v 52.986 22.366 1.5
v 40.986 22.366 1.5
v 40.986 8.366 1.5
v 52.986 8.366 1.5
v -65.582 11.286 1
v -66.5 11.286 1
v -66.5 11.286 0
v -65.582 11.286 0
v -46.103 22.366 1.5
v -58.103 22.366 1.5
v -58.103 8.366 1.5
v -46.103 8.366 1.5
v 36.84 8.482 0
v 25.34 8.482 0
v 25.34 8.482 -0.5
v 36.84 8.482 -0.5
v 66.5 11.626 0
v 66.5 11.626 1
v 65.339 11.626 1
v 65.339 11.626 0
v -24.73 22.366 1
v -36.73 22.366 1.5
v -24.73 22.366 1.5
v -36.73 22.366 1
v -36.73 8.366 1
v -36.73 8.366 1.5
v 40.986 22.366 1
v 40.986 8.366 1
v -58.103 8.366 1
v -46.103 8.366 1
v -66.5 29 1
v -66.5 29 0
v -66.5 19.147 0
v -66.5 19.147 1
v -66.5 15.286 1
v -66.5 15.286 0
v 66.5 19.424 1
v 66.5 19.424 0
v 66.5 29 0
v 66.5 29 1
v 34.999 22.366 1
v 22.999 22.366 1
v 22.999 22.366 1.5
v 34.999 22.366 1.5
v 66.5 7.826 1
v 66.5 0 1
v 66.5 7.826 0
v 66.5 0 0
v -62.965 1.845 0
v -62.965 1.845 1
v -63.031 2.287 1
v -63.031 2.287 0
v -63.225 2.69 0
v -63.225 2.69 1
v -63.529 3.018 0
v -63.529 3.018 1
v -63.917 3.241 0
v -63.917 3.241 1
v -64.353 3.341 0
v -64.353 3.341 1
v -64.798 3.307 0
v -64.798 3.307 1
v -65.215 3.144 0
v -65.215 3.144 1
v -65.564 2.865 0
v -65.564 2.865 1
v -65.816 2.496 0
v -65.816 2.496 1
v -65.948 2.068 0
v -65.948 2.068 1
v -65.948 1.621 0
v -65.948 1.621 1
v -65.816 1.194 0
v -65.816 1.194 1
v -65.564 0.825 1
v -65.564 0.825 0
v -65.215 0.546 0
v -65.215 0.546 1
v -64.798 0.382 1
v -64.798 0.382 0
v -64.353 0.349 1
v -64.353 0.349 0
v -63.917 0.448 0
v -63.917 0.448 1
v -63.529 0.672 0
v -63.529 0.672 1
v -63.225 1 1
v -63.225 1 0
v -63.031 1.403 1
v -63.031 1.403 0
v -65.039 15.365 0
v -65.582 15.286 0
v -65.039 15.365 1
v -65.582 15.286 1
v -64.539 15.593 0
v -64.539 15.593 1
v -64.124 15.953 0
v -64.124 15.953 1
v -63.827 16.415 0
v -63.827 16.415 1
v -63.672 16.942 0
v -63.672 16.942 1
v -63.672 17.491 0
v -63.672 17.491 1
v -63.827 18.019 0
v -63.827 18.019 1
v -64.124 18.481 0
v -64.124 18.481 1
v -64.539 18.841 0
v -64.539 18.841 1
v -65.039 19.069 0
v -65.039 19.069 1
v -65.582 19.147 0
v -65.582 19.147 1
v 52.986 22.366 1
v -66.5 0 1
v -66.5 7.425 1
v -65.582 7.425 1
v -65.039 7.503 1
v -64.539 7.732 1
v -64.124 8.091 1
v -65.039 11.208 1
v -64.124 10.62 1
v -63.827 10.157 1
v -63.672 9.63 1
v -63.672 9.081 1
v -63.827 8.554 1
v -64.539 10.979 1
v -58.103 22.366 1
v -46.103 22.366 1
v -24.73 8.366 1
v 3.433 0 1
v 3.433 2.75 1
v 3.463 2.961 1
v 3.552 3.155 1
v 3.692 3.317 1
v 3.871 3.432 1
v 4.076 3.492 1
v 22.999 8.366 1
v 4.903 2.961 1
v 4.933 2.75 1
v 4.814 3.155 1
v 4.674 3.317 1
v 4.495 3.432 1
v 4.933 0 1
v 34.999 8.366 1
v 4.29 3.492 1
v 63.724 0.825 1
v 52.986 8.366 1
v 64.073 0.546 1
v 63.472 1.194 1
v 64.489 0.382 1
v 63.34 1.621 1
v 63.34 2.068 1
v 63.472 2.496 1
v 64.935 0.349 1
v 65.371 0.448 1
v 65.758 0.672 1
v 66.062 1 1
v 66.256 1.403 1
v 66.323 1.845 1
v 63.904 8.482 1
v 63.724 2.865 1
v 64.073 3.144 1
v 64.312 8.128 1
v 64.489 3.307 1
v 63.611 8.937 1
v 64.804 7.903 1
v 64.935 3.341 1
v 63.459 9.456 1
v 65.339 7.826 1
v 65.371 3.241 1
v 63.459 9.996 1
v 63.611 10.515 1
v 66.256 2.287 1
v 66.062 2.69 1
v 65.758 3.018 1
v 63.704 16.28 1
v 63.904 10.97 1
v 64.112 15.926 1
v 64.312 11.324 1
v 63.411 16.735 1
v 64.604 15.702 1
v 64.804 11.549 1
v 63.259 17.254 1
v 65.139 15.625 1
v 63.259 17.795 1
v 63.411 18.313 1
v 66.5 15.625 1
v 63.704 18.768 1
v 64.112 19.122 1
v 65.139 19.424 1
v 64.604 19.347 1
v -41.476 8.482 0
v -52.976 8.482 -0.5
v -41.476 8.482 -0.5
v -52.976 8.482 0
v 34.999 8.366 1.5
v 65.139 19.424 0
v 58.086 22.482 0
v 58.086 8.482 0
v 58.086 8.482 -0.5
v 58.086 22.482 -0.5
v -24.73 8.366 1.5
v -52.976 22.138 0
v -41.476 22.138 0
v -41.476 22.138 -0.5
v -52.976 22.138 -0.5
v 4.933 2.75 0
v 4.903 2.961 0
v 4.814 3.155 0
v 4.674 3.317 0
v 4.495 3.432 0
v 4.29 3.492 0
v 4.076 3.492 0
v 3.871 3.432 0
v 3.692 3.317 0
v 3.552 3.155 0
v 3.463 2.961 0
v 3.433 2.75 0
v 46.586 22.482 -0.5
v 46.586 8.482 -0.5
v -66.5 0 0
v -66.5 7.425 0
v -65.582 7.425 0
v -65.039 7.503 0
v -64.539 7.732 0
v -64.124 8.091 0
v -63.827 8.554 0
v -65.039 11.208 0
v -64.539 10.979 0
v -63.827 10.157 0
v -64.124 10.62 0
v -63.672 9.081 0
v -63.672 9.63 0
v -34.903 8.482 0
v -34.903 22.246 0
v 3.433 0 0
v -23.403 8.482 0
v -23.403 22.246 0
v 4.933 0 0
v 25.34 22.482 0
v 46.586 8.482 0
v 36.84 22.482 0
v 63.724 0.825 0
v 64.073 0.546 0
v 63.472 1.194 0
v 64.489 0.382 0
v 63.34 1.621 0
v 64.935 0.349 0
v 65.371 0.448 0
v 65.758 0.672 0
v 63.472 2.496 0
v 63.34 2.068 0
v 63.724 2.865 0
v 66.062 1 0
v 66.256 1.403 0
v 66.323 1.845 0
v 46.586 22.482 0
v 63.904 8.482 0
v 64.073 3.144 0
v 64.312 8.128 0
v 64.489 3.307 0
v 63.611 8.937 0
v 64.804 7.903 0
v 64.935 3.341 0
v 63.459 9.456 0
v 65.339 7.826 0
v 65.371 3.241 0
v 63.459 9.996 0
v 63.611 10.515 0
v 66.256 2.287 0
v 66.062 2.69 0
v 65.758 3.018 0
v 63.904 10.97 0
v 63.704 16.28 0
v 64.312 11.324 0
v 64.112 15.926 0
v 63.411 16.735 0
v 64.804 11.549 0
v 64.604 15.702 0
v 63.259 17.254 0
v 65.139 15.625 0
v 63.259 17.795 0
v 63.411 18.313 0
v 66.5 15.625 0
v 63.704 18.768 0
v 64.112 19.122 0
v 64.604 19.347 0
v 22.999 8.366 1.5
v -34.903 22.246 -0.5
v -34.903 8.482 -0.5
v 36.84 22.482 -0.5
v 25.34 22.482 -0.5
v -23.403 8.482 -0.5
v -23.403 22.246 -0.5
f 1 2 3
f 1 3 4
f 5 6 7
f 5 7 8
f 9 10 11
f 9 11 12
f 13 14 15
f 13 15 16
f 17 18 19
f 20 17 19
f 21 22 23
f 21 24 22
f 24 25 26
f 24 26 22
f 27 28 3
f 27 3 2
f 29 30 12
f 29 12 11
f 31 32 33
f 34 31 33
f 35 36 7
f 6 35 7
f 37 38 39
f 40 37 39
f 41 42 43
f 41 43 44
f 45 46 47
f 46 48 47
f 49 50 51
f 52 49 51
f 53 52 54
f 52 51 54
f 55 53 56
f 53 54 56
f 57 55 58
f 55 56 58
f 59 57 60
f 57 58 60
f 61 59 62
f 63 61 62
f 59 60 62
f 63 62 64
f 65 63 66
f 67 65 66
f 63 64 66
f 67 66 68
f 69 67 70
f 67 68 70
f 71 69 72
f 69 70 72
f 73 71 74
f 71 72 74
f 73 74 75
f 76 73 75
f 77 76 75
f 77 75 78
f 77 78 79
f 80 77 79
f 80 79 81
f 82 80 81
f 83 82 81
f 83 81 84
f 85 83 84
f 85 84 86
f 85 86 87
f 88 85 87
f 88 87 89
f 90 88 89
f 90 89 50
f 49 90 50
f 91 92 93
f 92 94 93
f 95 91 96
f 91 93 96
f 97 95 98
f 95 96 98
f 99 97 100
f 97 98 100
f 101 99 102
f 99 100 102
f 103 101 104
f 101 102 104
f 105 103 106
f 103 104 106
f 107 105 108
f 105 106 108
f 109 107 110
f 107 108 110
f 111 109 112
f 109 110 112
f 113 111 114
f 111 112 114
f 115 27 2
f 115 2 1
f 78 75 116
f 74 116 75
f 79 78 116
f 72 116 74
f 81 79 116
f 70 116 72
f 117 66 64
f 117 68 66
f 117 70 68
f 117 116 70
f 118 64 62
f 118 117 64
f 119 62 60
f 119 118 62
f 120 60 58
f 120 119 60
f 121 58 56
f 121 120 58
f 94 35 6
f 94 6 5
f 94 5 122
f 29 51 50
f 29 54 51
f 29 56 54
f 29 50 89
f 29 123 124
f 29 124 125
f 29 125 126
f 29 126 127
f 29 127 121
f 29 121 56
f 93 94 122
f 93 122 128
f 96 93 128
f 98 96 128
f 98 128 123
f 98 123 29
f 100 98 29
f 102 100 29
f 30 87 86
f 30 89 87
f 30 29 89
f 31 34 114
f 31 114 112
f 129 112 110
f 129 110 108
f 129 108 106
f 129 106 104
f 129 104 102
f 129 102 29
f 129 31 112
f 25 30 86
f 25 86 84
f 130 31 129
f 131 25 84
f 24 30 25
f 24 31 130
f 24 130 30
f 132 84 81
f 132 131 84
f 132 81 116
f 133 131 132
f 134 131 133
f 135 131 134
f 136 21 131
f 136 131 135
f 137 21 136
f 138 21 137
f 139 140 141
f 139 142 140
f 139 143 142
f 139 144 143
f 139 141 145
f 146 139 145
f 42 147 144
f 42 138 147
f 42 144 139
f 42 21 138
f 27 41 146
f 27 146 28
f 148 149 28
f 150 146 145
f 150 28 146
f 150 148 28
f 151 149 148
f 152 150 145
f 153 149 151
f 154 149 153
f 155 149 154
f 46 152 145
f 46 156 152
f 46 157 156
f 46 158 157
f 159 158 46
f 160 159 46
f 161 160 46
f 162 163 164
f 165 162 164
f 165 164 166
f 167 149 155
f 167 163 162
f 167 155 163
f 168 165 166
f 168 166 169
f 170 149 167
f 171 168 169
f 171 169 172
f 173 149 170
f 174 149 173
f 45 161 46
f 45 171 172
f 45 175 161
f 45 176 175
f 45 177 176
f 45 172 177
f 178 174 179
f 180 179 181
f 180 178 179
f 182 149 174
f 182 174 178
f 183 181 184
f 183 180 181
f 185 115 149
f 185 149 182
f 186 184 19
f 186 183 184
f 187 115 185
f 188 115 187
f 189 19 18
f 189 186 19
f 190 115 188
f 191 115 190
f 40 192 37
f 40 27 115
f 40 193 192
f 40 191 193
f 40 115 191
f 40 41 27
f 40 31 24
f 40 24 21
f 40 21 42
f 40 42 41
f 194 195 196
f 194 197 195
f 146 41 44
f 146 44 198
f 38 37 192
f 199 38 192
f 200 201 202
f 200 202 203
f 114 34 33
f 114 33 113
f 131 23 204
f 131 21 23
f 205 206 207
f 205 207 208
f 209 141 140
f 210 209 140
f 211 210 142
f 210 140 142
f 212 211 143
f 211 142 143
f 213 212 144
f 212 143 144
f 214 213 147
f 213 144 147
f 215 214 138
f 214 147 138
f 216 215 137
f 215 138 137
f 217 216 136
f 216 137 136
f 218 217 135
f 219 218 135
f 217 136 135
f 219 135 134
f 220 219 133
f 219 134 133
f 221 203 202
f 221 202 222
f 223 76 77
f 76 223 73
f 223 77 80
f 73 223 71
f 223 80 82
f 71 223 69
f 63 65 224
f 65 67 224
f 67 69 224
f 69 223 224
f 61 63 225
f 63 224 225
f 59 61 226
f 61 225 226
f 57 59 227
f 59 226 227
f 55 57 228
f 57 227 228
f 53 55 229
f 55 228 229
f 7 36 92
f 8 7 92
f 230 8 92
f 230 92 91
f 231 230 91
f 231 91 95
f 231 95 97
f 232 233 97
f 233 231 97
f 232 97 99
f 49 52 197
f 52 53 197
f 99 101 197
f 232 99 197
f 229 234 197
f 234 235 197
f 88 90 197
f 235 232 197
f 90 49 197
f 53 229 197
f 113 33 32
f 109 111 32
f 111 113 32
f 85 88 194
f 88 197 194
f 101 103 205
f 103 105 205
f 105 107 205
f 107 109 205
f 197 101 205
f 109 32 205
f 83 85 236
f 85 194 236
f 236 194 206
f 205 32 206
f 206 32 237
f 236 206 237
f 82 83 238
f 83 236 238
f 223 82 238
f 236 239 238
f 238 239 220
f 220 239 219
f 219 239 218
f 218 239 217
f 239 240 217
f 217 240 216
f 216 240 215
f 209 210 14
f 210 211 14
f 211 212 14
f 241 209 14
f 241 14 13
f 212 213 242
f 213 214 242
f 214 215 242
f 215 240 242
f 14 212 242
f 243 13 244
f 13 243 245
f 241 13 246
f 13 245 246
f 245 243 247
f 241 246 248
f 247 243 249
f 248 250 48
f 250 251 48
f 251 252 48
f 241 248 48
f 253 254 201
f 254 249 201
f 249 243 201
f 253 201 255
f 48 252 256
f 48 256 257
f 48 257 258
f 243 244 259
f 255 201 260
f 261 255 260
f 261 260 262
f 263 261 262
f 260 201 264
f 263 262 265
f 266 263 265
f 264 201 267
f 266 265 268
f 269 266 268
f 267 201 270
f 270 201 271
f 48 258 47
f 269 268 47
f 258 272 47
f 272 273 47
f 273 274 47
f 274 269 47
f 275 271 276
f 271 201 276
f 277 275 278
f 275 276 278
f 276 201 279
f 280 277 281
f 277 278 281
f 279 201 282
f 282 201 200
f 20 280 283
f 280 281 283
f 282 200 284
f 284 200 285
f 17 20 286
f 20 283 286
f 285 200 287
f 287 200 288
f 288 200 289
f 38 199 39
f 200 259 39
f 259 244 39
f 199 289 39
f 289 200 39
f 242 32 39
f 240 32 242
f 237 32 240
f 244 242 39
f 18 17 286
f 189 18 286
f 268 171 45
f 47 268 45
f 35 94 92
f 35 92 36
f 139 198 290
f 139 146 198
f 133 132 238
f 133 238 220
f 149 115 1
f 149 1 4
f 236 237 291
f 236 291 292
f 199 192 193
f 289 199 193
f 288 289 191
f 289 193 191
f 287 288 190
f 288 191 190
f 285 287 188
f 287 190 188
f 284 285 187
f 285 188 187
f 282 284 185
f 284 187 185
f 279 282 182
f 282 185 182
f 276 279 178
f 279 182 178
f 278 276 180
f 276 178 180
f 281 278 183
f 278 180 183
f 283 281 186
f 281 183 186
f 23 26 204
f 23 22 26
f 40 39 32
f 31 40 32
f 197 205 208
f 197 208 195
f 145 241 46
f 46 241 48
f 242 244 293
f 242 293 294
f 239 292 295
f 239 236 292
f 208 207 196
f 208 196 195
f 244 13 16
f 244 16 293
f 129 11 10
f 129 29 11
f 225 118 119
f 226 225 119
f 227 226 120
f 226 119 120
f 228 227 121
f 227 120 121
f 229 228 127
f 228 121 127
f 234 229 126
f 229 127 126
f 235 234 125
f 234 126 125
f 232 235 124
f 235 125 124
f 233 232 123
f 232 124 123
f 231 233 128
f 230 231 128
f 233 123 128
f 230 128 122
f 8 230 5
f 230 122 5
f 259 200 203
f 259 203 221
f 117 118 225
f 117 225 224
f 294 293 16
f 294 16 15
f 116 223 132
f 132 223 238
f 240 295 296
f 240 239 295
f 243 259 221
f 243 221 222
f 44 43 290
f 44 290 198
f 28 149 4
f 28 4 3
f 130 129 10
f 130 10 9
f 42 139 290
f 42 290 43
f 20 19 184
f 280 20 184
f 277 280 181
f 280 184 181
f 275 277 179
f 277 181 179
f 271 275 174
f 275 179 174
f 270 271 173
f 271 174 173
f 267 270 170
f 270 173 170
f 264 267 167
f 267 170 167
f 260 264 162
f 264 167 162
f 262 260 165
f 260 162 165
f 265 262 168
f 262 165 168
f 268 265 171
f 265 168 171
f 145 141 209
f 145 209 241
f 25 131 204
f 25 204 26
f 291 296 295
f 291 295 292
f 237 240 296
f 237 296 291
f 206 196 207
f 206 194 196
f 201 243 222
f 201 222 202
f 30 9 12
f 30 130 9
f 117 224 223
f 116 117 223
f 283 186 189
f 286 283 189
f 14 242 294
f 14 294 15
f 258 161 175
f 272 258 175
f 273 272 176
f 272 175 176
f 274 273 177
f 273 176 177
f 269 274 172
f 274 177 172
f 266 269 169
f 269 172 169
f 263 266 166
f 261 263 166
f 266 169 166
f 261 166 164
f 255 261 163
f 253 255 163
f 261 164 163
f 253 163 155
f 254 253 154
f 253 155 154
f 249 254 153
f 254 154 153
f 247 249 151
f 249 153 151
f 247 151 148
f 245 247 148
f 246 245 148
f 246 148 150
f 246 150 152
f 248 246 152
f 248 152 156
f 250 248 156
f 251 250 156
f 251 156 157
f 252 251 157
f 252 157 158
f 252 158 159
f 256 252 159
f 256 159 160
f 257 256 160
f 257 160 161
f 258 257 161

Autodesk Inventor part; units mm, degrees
ref_plane "YZ Plane" through (0, 0, 0) normal (1, 0, 0) x (0, 1, 0)
ref_plane "XZ Plane" through (0, 0, 0) normal (0, 1, 0) x (-1, 0, 0)
ref_plane "XY Plane" through (0, 0, 0) normal (0, 0, 1) x (1, 0, 0)
sketch "Sketch1" plane through (0, 0, 0) normal (0, 0, 1) x (1, 0, 0)
  line L0 (0, 37.7) -> (0, -2.9) projected
  line L1 (-79.8, 0) -> (106.4, 0) projected
  line L2 (-66.5, 0) -> (66.5, 0)
  line L3 (66.5, 0) -> (66.5, 29)
  line L4 (66.5, 29) -> (-66.5, 29)
  line L5 (-66.5, 29) -> (-66.5, 0)
  dimension "d0" = 133
  dimension "d1" = 29
extrude "Extrusion1" add sketch "Sketch1" along normal blind 1
decal "Decal1"
decal "Decal2"
sketch "Sketch5" plane through (0, 0, 1) normal (0, 0, 1) x (1, 0, 0)
  line L0 (-66.5, 0) -> (-66.5, 29) projected
  line L1 (66.5, 29) -> (66.5, 0) projected
  line L2 (-66.5, 19.147) -> (-65.5825, 19.147)
  line L3 (-65.5825, 19.147) -> (-65.5825, 15.2864)
  line L4 (-65.5825, 15.2864) -> (-66.5, 15.2864)
  line L5 (-66.5, 15.2864) -> (-66.5, 19.147)
  line L6 (-66.5, 11.2859) -> (-65.5825, 11.2859)
  line L7 (-65.5825, 11.2859) -> (-65.5825, 7.4252)
  line L8 (-65.5825, 7.4252) -> (-66.5, 7.4252)
  line L9 (-66.5, 7.4252) -> (-66.5, 11.2859)
  circle A0 centre (-65.5825, 17.2167) radius 1.9303
  circle A1 centre (-65.5825, 9.3555) radius 1.9303
  line L10 (66.5, 19.4238) -> (65.1393, 19.4238)
  line L11 (65.1393, 19.4238) -> (65.1393, 15.6247)
  line L12 (65.1393, 15.6247) -> (66.5, 15.6247)
  line L13 (66.5, 15.6247) -> (66.5, 19.4238)
  line L14 (66.5, 11.6256) -> (65.3393, 11.6256)
  line L15 (65.3393, 11.6256) -> (65.3393, 7.8264)
  line L16 (65.3393, 7.8264) -> (66.5, 7.8264)
  line L17 (66.5, 7.8264) -> (66.5, 11.6256)
  circle A2 centre (65.1393, 17.5243) radius 1.8996
  circle A3 centre (65.3393, 9.726) radius 1.8996
  circle A4 centre (-64.4646, 1.8448) radius 1.5
  circle A5 centre (64.8231, 1.8448) radius 1.5
  dimension "d12" = 3
extrude "Extrusion2" cut sketch "Sketch5" against normal through all
sketch "Sketch6" plane through (0, 0, 1) normal (0, 0, 1) x (1, 0, 0)
  line L0 (66.5, 0) -> (-66.5, 0) projected
  line L1 (3.433, 2.75) -> (4.933, 2.75)
  line L2 (4.933, 2.75) -> (4.933, 0)
  line L3 (4.933, 0) -> (3.433, 0)
  line L4 (3.433, 0) -> (3.433, 2.75)
  circle A0 centre (4.183, 2.75) radius 0.75
  dimension "d15" = 1.5
  dimension "d16" = 2.75
extrude "Extrusion3" cut sketch "Sketch6" against normal through all
sketch "Sketch7" plane through (0, 0, 1) normal (0, 0, 1) x (1, 0, 0)
  line L0 (-46.1031, 8.3659) -> (-58.1031, 8.3659)
  line L1 (-58.1031, 8.3659) -> (-58.1031, 22.3659)
  line L2 (-58.1031, 22.3659) -> (-46.1031, 22.3659)
  line L3 (-46.1031, 22.3659) -> (-46.1031, 8.3659)
  line L4 (-36.7296, 22.3659) -> (-24.7296, 22.3659)
  line L5 (-24.7296, 22.3659) -> (-24.7296, 8.3659)
  line L6 (-24.7296, 8.3659) -> (-36.7296, 8.3659)
  line L7 (-36.7296, 8.3659) -> (-36.7296, 22.3659)
  line L8 (22.9991, 22.3659) -> (34.9991, 22.3659)
  line L9 (34.9991, 22.3659) -> (34.9991, 8.3659)
  line L10 (34.9991, 8.3659) -> (22.9991, 8.3659)
  line L11 (22.9991, 8.3659) -> (22.9991, 22.3659)
  line L12 (40.9859, 22.3659) -> (52.9859, 22.3659)
  line L13 (52.9859, 22.3659) -> (52.9859, 8.3659)
  line L14 (52.9859, 8.3659) -> (40.9859, 8.3659)
  line L15 (40.9859, 8.3659) -> (40.9859, 22.3659)
  dimension "d21" = 14
  dimension "d22" = 12
extrude "Extrusion4" add sketch "Sketch7" along normal blind 0.5
sketch "Sketch8" plane through (0, 0, 0) normal (0, 0, -1) x (-1, 0, 0)
  line L0 (-58.0858, 22.4822) -> (-46.5858, 22.4822)
  line L1 (-46.5858, 22.4822) -> (-46.5858, 8.4822)
  line L2 (-46.5858, 8.4822) -> (-58.0858, 8.4822)
  line L3 (-58.0858, 8.4822) -> (-58.0858, 22.4822)
  line L4 (-36.8395, 22.4822) -> (-25.3395, 22.4822)
  line L5 (-25.3395, 22.4822) -> (-25.3395, 8.4822)
  line L6 (-25.3395, 8.4822) -> (-36.8395, 8.4822)
  line L7 (-36.8395, 8.4822) -> (-36.8395, 22.4822)
  line L8 (23.4032, 22.2455) -> (34.9032, 22.2455)
  line L9 (34.9032, 22.2455) -> (34.9032, 8.4822)
  line L10 (34.9032, 8.4822) -> (23.4032, 8.4822)
  line L11 (23.4032, 8.4822) -> (23.4032, 22.2455)
  line L12 (41.476, 22.1379) -> (52.976, 22.1379)
  line L13 (52.976, 22.1379) -> (52.976, 8.4822)
  line L14 (52.976, 8.4822) -> (41.476, 8.4822)
  line L15 (41.476, 8.4822) -> (41.476, 22.1379)
  dimension "d28" = 11.5
  dimension "d29" = 14
extrude "Extrusion5" add sketch "Sketch8" along normal blind 0.5
sketch "Sketch3" plane through (0, 0, 1) normal (0, 0, 1) x (1, 0, 0)
  line L0 (-66.5, 29) -> (66.5, 29) construction
  line L1 (66.5, 29) -> (66.5, -0.391) construction
  line L2 (66.5, -0.391) -> (-66.5, -0.391) construction
  line L3 (-66.5, -0.391) -> (-66.5, 29) construction
sketch "Sketch4" plane through (0, 0, 0) normal (0, 0, -1) x (-1, 0, 0)
  line L0 (-66.5, 29) -> (66.5, 29) construction
  line L1 (66.5, 29) -> (66.5, -0.391) construction
  line L2 (66.5, -0.391) -> (-66.5, -0.391) construction
  line L3 (-66.5, -0.391) -> (-66.5, 29) construction
properties part number "config - ram"
